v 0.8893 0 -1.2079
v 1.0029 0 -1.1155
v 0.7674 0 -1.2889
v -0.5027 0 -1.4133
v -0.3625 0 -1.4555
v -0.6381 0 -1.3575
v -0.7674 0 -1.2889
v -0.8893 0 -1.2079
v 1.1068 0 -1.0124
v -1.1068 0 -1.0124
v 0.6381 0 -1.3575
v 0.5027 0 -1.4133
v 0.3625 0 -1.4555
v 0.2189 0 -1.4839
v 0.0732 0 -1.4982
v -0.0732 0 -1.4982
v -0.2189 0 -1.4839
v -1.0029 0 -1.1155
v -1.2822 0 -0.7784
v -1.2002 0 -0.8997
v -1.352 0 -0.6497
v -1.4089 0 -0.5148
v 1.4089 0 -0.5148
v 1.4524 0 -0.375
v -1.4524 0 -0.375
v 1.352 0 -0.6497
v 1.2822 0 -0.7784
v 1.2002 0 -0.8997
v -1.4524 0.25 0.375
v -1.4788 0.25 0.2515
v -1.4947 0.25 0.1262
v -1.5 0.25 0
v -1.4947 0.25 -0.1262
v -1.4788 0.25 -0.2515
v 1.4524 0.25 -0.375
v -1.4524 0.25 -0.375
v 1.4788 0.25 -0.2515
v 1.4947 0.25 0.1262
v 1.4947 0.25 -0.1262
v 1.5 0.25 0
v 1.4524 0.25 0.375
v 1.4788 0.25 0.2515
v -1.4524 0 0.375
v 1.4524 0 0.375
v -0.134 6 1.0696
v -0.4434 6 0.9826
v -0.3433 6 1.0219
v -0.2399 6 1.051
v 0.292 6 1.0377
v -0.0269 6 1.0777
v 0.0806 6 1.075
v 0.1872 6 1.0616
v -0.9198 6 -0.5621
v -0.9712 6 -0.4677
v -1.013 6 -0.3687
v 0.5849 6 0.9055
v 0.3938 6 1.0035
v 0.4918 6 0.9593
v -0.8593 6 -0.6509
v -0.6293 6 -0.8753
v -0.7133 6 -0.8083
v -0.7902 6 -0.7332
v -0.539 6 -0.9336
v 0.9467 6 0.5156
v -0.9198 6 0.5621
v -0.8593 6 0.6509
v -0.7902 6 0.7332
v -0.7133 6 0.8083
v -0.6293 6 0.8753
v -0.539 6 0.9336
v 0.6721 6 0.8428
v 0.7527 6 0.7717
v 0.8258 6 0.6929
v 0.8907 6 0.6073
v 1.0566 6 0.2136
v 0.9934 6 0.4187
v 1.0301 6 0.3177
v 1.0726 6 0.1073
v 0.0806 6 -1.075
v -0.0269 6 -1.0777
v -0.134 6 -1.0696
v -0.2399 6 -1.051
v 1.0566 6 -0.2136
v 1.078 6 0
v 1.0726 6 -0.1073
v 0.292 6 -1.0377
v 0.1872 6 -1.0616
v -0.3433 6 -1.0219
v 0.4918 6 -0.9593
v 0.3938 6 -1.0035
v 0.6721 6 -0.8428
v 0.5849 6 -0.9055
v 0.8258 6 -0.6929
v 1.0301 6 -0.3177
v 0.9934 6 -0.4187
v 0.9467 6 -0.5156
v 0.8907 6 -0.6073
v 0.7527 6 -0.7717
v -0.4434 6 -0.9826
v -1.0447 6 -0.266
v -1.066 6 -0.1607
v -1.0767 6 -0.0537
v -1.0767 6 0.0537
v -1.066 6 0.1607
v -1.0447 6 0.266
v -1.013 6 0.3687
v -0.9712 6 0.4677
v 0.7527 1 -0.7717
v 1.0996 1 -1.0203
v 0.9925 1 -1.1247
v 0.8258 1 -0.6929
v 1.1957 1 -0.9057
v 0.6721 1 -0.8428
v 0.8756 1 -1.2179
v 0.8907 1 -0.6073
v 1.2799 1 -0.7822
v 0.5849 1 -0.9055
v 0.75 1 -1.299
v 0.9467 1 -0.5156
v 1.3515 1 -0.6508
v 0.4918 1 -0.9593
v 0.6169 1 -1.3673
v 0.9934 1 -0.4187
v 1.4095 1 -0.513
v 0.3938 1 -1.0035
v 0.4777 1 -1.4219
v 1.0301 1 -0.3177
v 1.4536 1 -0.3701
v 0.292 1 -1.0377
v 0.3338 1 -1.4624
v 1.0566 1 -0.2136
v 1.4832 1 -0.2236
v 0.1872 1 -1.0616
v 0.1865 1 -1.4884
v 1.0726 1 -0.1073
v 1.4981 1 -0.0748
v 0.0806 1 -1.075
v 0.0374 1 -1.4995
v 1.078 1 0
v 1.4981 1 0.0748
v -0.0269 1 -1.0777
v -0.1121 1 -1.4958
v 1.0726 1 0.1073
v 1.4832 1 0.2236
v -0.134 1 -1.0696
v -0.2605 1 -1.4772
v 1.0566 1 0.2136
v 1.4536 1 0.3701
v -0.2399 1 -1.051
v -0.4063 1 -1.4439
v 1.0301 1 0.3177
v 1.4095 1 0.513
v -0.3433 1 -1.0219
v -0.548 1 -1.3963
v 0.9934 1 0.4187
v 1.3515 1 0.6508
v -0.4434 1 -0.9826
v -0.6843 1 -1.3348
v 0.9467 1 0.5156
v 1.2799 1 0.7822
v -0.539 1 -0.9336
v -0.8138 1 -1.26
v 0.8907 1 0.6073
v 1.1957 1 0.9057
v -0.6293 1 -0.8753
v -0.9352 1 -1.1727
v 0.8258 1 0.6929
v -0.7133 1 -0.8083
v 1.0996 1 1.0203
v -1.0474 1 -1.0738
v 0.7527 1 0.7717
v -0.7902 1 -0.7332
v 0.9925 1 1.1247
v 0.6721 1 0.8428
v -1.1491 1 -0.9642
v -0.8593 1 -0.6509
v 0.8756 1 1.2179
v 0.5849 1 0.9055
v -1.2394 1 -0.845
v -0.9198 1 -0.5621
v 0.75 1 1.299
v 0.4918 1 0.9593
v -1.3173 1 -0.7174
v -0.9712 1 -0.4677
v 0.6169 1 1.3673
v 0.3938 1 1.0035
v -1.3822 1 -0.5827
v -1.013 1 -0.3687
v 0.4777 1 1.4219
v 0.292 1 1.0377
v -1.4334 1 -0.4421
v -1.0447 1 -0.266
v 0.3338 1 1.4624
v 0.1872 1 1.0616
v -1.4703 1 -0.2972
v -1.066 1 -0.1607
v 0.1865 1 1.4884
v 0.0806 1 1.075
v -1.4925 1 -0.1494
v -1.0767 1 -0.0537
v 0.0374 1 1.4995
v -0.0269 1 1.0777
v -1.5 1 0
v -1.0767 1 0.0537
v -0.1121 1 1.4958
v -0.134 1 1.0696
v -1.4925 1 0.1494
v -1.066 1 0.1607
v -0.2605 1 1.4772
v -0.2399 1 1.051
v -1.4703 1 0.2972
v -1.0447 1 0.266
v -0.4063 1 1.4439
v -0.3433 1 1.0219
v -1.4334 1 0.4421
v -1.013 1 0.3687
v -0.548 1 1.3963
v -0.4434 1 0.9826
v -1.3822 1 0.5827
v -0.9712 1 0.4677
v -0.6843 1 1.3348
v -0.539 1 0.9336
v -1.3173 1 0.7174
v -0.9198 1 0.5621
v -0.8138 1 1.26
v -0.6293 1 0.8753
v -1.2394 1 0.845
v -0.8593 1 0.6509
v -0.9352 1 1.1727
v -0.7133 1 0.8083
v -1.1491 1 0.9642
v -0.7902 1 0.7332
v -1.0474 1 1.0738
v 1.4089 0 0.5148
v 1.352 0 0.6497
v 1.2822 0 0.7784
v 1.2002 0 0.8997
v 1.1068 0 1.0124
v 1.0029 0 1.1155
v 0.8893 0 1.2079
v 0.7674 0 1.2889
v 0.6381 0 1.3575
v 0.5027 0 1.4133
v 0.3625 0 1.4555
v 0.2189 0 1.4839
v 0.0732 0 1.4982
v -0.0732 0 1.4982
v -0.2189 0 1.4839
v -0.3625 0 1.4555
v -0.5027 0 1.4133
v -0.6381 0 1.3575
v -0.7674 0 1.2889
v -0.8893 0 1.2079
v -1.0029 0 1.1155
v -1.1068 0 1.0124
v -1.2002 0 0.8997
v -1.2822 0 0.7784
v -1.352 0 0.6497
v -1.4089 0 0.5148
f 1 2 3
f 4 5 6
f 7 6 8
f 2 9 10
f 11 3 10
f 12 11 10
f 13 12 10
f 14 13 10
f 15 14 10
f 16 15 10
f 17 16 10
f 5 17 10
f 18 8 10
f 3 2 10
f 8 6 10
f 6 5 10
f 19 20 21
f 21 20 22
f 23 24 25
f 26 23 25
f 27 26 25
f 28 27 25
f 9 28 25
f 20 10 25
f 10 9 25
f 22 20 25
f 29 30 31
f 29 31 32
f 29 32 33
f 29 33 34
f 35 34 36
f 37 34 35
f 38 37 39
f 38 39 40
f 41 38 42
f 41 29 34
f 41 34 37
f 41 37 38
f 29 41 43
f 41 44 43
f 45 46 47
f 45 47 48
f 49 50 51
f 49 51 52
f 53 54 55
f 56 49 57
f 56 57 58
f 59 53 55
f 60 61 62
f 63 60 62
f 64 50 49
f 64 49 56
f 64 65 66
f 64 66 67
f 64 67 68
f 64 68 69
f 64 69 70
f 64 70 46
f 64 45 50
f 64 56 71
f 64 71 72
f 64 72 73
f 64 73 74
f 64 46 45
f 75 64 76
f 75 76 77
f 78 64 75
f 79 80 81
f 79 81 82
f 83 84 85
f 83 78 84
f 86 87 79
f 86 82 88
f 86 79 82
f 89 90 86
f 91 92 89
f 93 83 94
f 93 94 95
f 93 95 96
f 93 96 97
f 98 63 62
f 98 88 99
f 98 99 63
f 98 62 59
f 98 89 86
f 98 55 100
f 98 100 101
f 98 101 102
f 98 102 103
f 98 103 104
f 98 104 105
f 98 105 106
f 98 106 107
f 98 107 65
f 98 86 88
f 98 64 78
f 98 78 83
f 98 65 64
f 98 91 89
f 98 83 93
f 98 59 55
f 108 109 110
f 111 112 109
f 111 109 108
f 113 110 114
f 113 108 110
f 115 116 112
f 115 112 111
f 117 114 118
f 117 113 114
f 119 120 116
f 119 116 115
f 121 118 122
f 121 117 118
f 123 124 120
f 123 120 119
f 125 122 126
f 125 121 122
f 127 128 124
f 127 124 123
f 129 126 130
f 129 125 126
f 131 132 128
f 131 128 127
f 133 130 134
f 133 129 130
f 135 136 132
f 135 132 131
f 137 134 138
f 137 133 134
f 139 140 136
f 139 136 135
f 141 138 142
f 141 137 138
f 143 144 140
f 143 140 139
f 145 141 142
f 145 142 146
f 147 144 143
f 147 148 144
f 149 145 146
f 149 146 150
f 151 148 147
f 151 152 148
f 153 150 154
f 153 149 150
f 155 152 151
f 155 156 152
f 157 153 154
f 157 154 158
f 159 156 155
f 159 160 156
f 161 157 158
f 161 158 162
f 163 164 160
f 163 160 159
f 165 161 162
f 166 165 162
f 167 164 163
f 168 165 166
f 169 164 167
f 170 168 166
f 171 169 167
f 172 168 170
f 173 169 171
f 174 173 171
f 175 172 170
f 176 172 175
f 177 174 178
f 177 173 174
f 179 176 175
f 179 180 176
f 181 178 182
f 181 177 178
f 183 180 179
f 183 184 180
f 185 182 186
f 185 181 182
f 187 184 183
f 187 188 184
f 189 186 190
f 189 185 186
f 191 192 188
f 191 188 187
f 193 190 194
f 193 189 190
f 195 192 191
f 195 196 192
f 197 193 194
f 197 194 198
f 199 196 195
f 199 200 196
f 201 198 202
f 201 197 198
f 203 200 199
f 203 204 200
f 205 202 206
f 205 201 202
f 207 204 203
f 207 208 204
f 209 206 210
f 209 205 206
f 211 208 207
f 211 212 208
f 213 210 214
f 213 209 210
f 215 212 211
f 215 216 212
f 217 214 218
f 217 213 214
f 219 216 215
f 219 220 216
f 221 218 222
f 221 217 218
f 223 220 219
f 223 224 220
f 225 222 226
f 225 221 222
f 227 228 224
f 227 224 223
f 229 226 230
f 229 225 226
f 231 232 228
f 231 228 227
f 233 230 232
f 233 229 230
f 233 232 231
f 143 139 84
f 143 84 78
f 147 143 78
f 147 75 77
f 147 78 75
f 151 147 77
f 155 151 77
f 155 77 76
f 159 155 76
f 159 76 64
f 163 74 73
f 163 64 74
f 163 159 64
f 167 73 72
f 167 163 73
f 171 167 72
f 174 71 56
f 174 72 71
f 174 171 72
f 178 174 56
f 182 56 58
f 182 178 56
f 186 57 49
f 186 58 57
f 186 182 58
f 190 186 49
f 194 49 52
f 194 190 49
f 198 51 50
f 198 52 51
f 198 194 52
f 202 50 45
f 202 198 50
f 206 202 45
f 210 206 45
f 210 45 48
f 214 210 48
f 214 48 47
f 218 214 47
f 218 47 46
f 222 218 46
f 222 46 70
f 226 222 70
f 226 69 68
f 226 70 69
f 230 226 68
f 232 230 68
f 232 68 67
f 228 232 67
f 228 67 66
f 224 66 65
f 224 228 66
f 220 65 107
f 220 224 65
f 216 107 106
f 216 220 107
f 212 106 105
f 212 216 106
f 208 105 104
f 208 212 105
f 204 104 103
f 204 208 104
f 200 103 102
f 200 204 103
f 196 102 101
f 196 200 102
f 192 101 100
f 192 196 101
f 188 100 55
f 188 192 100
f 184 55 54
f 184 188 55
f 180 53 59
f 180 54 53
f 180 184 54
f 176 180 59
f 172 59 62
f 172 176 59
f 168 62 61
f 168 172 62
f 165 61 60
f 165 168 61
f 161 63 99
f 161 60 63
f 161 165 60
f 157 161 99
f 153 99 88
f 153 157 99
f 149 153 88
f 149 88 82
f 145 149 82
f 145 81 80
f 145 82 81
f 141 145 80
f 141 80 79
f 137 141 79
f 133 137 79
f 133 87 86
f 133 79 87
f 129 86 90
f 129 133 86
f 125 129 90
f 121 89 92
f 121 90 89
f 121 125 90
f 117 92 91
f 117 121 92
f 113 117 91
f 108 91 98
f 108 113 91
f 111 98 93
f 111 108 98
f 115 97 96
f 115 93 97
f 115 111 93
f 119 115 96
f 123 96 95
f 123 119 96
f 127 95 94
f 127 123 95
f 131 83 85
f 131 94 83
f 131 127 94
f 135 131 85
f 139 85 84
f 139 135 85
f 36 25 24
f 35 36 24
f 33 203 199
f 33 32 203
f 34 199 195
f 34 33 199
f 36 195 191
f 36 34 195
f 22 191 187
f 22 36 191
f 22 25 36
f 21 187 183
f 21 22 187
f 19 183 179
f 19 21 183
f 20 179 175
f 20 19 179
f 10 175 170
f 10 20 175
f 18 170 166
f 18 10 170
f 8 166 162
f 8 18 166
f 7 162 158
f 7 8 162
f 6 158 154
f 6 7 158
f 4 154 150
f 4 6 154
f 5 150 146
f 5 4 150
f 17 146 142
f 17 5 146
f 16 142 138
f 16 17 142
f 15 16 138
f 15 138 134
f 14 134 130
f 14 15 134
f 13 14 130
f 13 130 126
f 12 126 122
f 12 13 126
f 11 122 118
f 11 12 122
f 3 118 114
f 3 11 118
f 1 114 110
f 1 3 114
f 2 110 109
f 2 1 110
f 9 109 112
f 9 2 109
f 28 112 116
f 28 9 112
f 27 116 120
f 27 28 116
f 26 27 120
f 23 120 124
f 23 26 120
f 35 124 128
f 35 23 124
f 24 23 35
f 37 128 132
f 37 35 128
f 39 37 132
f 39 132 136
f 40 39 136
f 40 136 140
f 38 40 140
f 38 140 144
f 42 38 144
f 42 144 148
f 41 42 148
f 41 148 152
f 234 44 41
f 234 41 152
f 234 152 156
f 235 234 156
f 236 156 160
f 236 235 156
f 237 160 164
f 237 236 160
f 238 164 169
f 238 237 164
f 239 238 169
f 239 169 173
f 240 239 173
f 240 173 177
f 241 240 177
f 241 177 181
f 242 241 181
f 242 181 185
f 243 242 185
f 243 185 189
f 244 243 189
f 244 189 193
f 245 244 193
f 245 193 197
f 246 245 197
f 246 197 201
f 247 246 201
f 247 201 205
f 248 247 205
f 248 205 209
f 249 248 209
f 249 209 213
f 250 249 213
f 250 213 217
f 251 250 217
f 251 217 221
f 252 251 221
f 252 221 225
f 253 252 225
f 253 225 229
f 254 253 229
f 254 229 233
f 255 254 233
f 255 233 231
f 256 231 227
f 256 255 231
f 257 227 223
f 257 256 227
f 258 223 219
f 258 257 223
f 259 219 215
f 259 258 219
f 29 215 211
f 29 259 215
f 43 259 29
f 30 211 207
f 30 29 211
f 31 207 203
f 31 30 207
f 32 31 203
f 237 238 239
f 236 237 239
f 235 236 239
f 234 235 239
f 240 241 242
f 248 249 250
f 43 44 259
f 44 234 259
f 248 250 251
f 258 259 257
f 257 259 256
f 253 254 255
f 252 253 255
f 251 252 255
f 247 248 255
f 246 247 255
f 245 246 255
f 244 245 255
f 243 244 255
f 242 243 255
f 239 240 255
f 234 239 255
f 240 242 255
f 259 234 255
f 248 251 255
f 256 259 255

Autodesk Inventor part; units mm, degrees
ref_plane "YZ Plane" through (0, 0, 0) normal (1, 0, 0) x (0, 1, 0)
ref_plane "XZ Plane" through (0, 0, 0) normal (0, 1, 0) x (-1, 0, 0)
ref_plane "XY Plane" through (0, 0, 0) normal (0, 0, 1) x (1, 0, 0)
sketch "Sketch1" plane through (0, 0, 0) normal (0, 1, 0) x (-1, 0, 0)
  circle A0 centre (0, 0) radius 1.5
  dimension "d0" = 3
extrude "Extrusion1" add sketch "Sketch1" along normal blind 1
sketch "Sketch2" plane through (0, 1, 0) normal (0, 1, 0) x (1, 0, 0)
  circle A0 centre (0, 0) radius 1.078
  dimension "d3" = 2.156
extrude "Extrusion2" add sketch "Sketch2" along normal blind 5
thread "Thread1" size "M2x0.4" class "6g" standard "ANSI Metric M Profile" full length
sketch "Sketch3" plane through (0, 0, 0) normal (0, -1, 0) x (1, 0, 0)
  line L0 (1.6528, 0.375) -> (-2.2622, 0.375)
  line L1 (-2.2622, 0.375) -> (-2.2622, -0.375)
  line L2 (-2.2622, -0.375) -> (1.6528, -0.375)
  line L3 (1.6528, -0.375) -> (1.6528, 0.375)
  point P0 (0, 0)
  dimension "d8" = 0.75
  dimension "d9" = 0.375
extrude "Extrusion3" cut sketch "Sketch3" against normal blind 0.25
properties part number "Screw_Terminal"
